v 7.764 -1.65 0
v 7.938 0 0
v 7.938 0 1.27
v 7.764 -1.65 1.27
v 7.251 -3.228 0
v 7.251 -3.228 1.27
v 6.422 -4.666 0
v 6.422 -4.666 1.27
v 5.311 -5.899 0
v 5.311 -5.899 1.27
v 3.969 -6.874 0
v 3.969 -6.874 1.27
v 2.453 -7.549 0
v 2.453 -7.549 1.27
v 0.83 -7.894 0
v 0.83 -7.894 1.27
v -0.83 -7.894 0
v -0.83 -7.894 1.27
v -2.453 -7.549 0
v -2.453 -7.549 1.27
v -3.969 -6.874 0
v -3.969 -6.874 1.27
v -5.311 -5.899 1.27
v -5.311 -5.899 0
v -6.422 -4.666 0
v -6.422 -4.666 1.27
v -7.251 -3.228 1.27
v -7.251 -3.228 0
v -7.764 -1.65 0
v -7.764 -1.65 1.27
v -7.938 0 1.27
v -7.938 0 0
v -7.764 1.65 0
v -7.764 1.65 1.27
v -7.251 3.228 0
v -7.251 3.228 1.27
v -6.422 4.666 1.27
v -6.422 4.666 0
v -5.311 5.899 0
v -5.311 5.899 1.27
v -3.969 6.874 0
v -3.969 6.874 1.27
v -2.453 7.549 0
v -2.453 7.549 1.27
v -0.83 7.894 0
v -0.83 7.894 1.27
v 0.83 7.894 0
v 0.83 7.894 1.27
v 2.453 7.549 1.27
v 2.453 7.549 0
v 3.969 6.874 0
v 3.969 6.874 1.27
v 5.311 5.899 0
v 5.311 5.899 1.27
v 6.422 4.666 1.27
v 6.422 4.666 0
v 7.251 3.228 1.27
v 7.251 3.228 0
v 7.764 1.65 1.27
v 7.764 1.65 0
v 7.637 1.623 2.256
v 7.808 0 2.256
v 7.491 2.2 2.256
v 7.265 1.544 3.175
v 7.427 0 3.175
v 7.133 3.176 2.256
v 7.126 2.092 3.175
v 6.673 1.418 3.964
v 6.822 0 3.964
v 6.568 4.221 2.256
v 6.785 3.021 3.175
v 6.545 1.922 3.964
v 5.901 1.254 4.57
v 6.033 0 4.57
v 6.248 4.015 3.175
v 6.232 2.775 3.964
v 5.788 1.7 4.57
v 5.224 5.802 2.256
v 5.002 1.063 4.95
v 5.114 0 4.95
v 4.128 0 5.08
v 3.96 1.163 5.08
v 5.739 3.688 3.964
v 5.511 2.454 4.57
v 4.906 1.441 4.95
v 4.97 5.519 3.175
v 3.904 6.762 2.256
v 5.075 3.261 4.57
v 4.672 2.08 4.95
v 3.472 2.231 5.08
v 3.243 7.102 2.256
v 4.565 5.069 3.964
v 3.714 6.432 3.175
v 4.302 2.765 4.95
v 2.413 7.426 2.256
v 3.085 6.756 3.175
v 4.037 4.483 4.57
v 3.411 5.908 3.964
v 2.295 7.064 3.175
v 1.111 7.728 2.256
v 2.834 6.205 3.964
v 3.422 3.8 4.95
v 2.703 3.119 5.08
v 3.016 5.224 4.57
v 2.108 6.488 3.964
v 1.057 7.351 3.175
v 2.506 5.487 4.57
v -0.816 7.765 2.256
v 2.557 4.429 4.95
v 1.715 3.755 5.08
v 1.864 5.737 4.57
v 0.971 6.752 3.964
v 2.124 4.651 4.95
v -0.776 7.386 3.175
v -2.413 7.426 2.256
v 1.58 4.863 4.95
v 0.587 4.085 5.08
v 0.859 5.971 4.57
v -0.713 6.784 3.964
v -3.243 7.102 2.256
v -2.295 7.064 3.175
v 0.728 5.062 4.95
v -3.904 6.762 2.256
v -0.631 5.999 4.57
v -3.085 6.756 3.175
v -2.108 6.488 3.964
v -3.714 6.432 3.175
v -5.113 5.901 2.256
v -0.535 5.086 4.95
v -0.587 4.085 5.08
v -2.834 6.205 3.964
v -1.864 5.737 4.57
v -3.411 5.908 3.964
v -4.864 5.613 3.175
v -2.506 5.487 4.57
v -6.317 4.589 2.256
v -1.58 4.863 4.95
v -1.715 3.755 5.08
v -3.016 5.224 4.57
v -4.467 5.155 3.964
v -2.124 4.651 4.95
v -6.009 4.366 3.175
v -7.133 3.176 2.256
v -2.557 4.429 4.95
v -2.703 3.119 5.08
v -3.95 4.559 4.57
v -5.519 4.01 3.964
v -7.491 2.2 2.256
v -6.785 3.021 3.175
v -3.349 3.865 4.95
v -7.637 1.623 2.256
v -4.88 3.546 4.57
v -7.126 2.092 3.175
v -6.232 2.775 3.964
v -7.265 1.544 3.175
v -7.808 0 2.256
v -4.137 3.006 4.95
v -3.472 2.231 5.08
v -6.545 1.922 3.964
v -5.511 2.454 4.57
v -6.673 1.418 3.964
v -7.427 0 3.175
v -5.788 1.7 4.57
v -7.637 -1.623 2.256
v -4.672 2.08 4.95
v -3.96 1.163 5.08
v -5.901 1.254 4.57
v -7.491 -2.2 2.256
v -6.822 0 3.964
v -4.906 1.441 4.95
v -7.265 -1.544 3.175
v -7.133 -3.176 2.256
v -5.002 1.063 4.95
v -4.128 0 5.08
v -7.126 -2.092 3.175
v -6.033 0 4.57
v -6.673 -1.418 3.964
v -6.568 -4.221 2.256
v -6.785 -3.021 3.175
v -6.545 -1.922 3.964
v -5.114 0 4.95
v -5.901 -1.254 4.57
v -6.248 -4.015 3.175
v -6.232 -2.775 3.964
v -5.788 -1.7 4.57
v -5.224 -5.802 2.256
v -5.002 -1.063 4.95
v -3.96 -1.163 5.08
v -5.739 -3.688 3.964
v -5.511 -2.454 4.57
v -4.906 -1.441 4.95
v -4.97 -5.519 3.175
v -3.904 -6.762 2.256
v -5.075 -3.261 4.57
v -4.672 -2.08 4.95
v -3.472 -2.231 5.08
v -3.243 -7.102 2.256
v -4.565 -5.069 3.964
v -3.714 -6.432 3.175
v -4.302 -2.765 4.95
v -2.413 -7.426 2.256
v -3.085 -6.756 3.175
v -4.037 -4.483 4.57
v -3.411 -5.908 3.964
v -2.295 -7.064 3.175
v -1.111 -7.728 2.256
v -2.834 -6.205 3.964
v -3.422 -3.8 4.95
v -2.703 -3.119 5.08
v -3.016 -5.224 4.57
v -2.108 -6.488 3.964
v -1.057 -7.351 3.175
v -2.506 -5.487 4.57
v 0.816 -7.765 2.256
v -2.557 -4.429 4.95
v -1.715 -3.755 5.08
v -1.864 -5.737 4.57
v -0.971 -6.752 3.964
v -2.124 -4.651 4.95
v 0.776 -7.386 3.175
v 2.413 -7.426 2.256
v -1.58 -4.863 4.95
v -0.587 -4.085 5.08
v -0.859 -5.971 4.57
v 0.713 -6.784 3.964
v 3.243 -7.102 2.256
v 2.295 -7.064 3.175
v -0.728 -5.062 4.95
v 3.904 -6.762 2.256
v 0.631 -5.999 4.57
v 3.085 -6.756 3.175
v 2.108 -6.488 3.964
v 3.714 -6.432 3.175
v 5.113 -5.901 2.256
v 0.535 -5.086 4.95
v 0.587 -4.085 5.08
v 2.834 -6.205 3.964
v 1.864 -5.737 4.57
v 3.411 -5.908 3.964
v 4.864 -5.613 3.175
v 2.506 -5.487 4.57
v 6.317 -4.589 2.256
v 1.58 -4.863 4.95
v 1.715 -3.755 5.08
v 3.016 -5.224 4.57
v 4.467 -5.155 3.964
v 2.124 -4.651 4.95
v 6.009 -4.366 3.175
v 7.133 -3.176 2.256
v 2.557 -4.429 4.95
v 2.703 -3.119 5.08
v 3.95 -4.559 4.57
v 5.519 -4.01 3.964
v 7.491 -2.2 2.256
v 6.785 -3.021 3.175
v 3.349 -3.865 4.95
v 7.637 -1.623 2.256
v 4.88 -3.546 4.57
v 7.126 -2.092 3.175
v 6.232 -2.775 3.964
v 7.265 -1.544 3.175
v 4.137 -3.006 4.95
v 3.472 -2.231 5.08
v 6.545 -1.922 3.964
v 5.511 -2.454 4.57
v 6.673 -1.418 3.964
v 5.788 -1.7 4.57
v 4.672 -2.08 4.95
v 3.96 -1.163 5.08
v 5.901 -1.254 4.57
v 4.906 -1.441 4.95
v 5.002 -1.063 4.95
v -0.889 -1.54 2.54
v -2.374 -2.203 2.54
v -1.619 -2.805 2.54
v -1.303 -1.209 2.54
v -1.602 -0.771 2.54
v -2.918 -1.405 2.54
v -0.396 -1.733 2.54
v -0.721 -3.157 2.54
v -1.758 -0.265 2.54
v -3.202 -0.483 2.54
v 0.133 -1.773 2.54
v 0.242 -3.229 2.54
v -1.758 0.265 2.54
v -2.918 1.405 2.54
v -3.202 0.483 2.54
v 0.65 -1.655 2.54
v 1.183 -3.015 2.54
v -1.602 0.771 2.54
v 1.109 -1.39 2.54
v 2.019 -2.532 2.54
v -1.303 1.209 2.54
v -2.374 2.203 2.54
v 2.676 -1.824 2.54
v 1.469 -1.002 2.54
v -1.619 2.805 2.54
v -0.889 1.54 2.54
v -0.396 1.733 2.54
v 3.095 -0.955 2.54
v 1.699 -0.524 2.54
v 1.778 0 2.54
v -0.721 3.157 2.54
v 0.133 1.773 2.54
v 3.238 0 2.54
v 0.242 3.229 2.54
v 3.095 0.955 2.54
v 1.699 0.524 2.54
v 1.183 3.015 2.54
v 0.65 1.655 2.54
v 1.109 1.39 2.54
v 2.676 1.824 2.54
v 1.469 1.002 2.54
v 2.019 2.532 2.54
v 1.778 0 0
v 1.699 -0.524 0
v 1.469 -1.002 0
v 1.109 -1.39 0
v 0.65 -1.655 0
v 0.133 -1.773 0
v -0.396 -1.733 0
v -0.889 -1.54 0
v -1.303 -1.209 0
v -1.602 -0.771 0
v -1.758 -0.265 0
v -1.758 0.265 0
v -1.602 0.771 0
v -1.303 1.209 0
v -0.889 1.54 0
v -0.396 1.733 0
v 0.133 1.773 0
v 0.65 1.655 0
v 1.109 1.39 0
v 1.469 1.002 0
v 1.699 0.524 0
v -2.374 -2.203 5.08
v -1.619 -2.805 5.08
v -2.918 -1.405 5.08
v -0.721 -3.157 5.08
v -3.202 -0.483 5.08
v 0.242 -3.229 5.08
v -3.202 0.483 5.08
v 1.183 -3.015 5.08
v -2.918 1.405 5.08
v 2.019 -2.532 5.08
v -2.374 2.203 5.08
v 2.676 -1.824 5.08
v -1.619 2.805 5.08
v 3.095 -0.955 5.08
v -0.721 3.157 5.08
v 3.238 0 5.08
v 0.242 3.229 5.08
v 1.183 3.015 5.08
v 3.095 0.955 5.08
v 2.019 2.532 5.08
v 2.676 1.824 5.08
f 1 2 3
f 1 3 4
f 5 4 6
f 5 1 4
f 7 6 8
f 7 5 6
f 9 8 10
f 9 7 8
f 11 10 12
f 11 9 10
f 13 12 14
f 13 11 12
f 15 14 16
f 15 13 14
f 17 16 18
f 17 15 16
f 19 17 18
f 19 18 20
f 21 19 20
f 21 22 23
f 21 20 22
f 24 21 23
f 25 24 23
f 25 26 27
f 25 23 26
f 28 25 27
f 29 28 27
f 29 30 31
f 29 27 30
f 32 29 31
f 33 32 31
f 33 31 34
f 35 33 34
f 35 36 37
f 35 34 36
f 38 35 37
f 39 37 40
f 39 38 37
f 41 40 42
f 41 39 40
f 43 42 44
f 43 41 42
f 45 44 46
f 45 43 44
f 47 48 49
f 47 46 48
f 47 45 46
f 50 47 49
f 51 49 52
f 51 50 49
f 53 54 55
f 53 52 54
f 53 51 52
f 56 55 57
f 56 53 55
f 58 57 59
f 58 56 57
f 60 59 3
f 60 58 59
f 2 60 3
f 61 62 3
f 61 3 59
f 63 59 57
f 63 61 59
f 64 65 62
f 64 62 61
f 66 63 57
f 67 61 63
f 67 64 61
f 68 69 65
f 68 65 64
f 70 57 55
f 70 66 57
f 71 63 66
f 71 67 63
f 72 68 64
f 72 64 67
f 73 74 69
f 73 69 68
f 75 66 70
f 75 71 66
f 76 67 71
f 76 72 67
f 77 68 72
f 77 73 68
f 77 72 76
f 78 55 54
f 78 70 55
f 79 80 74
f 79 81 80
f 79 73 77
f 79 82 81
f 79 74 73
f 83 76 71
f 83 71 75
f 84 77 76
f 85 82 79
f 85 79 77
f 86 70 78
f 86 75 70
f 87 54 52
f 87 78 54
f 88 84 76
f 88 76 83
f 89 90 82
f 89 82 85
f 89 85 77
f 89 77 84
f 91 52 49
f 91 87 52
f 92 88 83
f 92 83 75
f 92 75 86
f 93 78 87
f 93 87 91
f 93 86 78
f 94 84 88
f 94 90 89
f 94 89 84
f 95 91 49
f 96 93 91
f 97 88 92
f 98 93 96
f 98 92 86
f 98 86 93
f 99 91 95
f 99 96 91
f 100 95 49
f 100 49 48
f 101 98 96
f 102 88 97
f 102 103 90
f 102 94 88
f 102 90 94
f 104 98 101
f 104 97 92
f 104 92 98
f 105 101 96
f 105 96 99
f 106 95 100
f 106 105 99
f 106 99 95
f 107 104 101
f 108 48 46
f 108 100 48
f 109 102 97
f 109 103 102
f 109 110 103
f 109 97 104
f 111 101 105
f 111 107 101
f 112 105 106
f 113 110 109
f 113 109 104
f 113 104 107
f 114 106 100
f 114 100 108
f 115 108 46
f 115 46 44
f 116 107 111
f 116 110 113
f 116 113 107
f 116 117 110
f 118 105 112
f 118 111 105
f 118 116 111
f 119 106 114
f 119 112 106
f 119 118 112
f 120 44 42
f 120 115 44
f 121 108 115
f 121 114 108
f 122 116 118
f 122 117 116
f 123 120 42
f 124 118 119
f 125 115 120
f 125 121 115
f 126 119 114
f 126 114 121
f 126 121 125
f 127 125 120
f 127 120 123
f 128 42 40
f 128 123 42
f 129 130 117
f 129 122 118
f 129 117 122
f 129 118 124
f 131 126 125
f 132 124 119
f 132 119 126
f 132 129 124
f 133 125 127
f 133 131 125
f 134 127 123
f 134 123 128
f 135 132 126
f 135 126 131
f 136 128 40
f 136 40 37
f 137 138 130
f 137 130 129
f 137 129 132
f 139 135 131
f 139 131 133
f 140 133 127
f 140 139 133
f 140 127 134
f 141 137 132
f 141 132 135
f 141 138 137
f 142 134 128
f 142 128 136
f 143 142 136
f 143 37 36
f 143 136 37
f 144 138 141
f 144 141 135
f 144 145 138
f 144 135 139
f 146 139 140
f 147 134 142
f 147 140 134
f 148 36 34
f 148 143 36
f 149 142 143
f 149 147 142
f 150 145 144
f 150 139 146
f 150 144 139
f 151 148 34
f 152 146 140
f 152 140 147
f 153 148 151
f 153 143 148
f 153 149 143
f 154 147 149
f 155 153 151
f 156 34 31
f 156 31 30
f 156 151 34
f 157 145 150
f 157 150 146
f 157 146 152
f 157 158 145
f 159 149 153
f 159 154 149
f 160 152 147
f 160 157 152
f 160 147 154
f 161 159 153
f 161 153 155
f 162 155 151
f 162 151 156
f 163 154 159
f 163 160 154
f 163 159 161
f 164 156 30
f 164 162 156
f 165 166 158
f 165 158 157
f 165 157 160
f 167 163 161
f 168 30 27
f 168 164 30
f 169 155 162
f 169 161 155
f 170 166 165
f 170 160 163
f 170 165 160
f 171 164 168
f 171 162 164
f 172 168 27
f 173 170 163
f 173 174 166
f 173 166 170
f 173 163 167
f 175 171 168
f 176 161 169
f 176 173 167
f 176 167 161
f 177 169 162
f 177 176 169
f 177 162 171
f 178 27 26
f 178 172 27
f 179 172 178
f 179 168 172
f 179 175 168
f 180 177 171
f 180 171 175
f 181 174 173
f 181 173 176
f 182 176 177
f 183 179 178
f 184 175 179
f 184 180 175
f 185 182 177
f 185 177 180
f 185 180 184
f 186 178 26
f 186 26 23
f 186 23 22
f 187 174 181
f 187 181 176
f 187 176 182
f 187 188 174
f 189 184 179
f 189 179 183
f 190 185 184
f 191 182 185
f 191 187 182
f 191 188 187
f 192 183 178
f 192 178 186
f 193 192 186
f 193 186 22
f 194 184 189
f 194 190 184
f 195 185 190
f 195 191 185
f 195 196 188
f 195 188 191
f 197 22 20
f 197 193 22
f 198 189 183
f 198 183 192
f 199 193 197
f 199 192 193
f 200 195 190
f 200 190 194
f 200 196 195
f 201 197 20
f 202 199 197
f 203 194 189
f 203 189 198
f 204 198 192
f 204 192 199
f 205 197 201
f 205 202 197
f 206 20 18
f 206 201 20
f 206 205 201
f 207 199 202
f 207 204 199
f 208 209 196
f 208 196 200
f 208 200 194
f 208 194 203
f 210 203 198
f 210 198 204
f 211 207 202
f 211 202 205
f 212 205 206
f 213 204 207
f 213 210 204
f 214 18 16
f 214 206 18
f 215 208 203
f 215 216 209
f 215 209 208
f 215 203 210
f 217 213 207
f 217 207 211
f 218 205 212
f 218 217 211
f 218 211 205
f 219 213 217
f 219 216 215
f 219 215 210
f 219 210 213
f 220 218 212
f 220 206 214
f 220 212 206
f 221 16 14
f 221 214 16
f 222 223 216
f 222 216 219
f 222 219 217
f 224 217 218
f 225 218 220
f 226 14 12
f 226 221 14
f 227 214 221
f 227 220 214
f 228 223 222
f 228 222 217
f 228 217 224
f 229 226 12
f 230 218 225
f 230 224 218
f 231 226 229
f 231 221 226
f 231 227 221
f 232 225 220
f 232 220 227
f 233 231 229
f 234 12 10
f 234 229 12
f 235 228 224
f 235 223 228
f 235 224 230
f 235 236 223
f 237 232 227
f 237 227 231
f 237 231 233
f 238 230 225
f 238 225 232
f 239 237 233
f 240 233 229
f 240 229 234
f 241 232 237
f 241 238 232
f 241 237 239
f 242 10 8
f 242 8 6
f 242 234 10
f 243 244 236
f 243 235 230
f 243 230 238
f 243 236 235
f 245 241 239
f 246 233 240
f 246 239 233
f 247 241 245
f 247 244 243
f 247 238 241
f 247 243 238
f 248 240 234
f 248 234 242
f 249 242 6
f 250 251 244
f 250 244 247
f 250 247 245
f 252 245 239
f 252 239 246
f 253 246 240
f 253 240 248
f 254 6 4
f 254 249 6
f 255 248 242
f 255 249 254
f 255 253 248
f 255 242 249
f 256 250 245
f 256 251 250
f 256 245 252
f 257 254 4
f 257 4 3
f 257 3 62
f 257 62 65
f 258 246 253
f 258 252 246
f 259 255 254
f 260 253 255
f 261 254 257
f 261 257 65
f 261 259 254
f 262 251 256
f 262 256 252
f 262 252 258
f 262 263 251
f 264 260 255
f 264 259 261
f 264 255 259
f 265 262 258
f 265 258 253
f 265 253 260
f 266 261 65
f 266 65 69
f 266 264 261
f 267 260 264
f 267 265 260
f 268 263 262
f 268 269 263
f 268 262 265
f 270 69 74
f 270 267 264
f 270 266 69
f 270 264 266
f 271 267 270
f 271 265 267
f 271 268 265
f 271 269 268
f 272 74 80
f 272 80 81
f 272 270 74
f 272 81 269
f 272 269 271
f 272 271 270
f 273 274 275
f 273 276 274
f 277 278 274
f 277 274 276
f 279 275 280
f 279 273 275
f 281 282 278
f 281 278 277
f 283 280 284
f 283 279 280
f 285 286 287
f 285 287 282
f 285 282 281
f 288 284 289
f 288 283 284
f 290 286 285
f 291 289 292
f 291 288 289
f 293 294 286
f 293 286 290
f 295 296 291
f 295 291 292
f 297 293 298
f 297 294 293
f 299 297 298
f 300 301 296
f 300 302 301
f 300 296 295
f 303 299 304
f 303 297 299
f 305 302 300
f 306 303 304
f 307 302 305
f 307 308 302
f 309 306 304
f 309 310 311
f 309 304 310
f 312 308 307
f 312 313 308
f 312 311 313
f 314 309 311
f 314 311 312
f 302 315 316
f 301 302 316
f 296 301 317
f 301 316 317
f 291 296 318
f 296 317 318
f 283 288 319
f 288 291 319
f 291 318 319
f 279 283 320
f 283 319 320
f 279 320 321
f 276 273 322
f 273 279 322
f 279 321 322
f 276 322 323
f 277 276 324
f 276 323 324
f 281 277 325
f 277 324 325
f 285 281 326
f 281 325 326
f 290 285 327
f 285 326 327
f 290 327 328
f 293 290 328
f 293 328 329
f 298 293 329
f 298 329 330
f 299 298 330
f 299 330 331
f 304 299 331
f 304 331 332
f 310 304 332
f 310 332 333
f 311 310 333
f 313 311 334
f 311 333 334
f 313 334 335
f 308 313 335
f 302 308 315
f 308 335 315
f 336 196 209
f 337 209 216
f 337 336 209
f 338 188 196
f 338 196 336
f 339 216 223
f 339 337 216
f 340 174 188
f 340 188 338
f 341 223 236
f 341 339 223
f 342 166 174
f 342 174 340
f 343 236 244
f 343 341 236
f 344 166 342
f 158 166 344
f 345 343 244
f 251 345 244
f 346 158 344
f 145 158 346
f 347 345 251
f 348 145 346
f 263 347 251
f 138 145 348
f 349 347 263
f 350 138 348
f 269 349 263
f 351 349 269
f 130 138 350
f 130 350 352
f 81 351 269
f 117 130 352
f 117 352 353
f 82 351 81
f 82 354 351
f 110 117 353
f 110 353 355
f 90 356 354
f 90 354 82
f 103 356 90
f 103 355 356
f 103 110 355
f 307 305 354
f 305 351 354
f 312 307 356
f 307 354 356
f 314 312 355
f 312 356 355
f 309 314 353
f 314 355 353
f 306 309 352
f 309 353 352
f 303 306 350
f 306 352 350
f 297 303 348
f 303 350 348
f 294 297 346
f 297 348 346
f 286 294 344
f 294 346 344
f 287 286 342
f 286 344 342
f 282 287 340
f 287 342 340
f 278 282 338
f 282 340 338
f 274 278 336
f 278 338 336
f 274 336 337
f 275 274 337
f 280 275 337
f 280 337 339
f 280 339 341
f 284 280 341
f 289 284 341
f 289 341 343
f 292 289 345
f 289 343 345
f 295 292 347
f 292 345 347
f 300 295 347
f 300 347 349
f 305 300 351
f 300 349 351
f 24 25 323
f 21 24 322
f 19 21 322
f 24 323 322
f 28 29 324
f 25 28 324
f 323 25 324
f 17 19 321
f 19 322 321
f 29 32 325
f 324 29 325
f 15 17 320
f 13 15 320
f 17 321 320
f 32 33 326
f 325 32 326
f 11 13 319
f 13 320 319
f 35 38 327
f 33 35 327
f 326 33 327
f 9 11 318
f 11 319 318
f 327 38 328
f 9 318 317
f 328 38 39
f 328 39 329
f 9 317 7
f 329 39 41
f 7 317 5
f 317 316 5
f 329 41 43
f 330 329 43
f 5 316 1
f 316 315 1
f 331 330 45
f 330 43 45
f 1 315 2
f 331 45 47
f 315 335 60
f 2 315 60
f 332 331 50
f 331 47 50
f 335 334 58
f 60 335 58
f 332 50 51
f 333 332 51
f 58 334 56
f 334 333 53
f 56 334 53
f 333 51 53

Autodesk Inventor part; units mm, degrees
ref_plane "YZ Plane" through (0, 0, 0) normal (1, 0, 0) x (0, 1, 0)
ref_plane "XZ Plane" through (0, 0, 0) normal (0, 1, 0) x (-1, 0, 0)
ref_plane "XY Plane" through (0, 0, 0) normal (0, 0, 1) x (1, 0, 0)
sketch "Sketch1" plane through (0, 0, 0) normal (0, 0, 1) x (1, 0, 0)
  circle A0 centre (0, 0) radius 1.778
  circle A1 centre (0, 0) radius 7.9375
  dimension "d0" = 3.556
  dimension "d1" = 15.875
extrude "Extrusion1" add sketch "Sketch1" along normal blind 5.08
sketch "Sketch2" plane through (0, 0, 5.08) normal (0, 0, 1) x (1, 0, 0)
  circle A0 centre (0, 0) radius 1.778 projected
  circle A1 centre (0, 0) radius 3.2385
  dimension "d4" = 6.477
extrude "Extrusion2" cut sketch "Sketch2" against normal blind 2.54
fillet "Fillet1" radius 3.81 1 edges at (-7.9375, 0, 5.08)
properties part number "HANDLE WASHER"
